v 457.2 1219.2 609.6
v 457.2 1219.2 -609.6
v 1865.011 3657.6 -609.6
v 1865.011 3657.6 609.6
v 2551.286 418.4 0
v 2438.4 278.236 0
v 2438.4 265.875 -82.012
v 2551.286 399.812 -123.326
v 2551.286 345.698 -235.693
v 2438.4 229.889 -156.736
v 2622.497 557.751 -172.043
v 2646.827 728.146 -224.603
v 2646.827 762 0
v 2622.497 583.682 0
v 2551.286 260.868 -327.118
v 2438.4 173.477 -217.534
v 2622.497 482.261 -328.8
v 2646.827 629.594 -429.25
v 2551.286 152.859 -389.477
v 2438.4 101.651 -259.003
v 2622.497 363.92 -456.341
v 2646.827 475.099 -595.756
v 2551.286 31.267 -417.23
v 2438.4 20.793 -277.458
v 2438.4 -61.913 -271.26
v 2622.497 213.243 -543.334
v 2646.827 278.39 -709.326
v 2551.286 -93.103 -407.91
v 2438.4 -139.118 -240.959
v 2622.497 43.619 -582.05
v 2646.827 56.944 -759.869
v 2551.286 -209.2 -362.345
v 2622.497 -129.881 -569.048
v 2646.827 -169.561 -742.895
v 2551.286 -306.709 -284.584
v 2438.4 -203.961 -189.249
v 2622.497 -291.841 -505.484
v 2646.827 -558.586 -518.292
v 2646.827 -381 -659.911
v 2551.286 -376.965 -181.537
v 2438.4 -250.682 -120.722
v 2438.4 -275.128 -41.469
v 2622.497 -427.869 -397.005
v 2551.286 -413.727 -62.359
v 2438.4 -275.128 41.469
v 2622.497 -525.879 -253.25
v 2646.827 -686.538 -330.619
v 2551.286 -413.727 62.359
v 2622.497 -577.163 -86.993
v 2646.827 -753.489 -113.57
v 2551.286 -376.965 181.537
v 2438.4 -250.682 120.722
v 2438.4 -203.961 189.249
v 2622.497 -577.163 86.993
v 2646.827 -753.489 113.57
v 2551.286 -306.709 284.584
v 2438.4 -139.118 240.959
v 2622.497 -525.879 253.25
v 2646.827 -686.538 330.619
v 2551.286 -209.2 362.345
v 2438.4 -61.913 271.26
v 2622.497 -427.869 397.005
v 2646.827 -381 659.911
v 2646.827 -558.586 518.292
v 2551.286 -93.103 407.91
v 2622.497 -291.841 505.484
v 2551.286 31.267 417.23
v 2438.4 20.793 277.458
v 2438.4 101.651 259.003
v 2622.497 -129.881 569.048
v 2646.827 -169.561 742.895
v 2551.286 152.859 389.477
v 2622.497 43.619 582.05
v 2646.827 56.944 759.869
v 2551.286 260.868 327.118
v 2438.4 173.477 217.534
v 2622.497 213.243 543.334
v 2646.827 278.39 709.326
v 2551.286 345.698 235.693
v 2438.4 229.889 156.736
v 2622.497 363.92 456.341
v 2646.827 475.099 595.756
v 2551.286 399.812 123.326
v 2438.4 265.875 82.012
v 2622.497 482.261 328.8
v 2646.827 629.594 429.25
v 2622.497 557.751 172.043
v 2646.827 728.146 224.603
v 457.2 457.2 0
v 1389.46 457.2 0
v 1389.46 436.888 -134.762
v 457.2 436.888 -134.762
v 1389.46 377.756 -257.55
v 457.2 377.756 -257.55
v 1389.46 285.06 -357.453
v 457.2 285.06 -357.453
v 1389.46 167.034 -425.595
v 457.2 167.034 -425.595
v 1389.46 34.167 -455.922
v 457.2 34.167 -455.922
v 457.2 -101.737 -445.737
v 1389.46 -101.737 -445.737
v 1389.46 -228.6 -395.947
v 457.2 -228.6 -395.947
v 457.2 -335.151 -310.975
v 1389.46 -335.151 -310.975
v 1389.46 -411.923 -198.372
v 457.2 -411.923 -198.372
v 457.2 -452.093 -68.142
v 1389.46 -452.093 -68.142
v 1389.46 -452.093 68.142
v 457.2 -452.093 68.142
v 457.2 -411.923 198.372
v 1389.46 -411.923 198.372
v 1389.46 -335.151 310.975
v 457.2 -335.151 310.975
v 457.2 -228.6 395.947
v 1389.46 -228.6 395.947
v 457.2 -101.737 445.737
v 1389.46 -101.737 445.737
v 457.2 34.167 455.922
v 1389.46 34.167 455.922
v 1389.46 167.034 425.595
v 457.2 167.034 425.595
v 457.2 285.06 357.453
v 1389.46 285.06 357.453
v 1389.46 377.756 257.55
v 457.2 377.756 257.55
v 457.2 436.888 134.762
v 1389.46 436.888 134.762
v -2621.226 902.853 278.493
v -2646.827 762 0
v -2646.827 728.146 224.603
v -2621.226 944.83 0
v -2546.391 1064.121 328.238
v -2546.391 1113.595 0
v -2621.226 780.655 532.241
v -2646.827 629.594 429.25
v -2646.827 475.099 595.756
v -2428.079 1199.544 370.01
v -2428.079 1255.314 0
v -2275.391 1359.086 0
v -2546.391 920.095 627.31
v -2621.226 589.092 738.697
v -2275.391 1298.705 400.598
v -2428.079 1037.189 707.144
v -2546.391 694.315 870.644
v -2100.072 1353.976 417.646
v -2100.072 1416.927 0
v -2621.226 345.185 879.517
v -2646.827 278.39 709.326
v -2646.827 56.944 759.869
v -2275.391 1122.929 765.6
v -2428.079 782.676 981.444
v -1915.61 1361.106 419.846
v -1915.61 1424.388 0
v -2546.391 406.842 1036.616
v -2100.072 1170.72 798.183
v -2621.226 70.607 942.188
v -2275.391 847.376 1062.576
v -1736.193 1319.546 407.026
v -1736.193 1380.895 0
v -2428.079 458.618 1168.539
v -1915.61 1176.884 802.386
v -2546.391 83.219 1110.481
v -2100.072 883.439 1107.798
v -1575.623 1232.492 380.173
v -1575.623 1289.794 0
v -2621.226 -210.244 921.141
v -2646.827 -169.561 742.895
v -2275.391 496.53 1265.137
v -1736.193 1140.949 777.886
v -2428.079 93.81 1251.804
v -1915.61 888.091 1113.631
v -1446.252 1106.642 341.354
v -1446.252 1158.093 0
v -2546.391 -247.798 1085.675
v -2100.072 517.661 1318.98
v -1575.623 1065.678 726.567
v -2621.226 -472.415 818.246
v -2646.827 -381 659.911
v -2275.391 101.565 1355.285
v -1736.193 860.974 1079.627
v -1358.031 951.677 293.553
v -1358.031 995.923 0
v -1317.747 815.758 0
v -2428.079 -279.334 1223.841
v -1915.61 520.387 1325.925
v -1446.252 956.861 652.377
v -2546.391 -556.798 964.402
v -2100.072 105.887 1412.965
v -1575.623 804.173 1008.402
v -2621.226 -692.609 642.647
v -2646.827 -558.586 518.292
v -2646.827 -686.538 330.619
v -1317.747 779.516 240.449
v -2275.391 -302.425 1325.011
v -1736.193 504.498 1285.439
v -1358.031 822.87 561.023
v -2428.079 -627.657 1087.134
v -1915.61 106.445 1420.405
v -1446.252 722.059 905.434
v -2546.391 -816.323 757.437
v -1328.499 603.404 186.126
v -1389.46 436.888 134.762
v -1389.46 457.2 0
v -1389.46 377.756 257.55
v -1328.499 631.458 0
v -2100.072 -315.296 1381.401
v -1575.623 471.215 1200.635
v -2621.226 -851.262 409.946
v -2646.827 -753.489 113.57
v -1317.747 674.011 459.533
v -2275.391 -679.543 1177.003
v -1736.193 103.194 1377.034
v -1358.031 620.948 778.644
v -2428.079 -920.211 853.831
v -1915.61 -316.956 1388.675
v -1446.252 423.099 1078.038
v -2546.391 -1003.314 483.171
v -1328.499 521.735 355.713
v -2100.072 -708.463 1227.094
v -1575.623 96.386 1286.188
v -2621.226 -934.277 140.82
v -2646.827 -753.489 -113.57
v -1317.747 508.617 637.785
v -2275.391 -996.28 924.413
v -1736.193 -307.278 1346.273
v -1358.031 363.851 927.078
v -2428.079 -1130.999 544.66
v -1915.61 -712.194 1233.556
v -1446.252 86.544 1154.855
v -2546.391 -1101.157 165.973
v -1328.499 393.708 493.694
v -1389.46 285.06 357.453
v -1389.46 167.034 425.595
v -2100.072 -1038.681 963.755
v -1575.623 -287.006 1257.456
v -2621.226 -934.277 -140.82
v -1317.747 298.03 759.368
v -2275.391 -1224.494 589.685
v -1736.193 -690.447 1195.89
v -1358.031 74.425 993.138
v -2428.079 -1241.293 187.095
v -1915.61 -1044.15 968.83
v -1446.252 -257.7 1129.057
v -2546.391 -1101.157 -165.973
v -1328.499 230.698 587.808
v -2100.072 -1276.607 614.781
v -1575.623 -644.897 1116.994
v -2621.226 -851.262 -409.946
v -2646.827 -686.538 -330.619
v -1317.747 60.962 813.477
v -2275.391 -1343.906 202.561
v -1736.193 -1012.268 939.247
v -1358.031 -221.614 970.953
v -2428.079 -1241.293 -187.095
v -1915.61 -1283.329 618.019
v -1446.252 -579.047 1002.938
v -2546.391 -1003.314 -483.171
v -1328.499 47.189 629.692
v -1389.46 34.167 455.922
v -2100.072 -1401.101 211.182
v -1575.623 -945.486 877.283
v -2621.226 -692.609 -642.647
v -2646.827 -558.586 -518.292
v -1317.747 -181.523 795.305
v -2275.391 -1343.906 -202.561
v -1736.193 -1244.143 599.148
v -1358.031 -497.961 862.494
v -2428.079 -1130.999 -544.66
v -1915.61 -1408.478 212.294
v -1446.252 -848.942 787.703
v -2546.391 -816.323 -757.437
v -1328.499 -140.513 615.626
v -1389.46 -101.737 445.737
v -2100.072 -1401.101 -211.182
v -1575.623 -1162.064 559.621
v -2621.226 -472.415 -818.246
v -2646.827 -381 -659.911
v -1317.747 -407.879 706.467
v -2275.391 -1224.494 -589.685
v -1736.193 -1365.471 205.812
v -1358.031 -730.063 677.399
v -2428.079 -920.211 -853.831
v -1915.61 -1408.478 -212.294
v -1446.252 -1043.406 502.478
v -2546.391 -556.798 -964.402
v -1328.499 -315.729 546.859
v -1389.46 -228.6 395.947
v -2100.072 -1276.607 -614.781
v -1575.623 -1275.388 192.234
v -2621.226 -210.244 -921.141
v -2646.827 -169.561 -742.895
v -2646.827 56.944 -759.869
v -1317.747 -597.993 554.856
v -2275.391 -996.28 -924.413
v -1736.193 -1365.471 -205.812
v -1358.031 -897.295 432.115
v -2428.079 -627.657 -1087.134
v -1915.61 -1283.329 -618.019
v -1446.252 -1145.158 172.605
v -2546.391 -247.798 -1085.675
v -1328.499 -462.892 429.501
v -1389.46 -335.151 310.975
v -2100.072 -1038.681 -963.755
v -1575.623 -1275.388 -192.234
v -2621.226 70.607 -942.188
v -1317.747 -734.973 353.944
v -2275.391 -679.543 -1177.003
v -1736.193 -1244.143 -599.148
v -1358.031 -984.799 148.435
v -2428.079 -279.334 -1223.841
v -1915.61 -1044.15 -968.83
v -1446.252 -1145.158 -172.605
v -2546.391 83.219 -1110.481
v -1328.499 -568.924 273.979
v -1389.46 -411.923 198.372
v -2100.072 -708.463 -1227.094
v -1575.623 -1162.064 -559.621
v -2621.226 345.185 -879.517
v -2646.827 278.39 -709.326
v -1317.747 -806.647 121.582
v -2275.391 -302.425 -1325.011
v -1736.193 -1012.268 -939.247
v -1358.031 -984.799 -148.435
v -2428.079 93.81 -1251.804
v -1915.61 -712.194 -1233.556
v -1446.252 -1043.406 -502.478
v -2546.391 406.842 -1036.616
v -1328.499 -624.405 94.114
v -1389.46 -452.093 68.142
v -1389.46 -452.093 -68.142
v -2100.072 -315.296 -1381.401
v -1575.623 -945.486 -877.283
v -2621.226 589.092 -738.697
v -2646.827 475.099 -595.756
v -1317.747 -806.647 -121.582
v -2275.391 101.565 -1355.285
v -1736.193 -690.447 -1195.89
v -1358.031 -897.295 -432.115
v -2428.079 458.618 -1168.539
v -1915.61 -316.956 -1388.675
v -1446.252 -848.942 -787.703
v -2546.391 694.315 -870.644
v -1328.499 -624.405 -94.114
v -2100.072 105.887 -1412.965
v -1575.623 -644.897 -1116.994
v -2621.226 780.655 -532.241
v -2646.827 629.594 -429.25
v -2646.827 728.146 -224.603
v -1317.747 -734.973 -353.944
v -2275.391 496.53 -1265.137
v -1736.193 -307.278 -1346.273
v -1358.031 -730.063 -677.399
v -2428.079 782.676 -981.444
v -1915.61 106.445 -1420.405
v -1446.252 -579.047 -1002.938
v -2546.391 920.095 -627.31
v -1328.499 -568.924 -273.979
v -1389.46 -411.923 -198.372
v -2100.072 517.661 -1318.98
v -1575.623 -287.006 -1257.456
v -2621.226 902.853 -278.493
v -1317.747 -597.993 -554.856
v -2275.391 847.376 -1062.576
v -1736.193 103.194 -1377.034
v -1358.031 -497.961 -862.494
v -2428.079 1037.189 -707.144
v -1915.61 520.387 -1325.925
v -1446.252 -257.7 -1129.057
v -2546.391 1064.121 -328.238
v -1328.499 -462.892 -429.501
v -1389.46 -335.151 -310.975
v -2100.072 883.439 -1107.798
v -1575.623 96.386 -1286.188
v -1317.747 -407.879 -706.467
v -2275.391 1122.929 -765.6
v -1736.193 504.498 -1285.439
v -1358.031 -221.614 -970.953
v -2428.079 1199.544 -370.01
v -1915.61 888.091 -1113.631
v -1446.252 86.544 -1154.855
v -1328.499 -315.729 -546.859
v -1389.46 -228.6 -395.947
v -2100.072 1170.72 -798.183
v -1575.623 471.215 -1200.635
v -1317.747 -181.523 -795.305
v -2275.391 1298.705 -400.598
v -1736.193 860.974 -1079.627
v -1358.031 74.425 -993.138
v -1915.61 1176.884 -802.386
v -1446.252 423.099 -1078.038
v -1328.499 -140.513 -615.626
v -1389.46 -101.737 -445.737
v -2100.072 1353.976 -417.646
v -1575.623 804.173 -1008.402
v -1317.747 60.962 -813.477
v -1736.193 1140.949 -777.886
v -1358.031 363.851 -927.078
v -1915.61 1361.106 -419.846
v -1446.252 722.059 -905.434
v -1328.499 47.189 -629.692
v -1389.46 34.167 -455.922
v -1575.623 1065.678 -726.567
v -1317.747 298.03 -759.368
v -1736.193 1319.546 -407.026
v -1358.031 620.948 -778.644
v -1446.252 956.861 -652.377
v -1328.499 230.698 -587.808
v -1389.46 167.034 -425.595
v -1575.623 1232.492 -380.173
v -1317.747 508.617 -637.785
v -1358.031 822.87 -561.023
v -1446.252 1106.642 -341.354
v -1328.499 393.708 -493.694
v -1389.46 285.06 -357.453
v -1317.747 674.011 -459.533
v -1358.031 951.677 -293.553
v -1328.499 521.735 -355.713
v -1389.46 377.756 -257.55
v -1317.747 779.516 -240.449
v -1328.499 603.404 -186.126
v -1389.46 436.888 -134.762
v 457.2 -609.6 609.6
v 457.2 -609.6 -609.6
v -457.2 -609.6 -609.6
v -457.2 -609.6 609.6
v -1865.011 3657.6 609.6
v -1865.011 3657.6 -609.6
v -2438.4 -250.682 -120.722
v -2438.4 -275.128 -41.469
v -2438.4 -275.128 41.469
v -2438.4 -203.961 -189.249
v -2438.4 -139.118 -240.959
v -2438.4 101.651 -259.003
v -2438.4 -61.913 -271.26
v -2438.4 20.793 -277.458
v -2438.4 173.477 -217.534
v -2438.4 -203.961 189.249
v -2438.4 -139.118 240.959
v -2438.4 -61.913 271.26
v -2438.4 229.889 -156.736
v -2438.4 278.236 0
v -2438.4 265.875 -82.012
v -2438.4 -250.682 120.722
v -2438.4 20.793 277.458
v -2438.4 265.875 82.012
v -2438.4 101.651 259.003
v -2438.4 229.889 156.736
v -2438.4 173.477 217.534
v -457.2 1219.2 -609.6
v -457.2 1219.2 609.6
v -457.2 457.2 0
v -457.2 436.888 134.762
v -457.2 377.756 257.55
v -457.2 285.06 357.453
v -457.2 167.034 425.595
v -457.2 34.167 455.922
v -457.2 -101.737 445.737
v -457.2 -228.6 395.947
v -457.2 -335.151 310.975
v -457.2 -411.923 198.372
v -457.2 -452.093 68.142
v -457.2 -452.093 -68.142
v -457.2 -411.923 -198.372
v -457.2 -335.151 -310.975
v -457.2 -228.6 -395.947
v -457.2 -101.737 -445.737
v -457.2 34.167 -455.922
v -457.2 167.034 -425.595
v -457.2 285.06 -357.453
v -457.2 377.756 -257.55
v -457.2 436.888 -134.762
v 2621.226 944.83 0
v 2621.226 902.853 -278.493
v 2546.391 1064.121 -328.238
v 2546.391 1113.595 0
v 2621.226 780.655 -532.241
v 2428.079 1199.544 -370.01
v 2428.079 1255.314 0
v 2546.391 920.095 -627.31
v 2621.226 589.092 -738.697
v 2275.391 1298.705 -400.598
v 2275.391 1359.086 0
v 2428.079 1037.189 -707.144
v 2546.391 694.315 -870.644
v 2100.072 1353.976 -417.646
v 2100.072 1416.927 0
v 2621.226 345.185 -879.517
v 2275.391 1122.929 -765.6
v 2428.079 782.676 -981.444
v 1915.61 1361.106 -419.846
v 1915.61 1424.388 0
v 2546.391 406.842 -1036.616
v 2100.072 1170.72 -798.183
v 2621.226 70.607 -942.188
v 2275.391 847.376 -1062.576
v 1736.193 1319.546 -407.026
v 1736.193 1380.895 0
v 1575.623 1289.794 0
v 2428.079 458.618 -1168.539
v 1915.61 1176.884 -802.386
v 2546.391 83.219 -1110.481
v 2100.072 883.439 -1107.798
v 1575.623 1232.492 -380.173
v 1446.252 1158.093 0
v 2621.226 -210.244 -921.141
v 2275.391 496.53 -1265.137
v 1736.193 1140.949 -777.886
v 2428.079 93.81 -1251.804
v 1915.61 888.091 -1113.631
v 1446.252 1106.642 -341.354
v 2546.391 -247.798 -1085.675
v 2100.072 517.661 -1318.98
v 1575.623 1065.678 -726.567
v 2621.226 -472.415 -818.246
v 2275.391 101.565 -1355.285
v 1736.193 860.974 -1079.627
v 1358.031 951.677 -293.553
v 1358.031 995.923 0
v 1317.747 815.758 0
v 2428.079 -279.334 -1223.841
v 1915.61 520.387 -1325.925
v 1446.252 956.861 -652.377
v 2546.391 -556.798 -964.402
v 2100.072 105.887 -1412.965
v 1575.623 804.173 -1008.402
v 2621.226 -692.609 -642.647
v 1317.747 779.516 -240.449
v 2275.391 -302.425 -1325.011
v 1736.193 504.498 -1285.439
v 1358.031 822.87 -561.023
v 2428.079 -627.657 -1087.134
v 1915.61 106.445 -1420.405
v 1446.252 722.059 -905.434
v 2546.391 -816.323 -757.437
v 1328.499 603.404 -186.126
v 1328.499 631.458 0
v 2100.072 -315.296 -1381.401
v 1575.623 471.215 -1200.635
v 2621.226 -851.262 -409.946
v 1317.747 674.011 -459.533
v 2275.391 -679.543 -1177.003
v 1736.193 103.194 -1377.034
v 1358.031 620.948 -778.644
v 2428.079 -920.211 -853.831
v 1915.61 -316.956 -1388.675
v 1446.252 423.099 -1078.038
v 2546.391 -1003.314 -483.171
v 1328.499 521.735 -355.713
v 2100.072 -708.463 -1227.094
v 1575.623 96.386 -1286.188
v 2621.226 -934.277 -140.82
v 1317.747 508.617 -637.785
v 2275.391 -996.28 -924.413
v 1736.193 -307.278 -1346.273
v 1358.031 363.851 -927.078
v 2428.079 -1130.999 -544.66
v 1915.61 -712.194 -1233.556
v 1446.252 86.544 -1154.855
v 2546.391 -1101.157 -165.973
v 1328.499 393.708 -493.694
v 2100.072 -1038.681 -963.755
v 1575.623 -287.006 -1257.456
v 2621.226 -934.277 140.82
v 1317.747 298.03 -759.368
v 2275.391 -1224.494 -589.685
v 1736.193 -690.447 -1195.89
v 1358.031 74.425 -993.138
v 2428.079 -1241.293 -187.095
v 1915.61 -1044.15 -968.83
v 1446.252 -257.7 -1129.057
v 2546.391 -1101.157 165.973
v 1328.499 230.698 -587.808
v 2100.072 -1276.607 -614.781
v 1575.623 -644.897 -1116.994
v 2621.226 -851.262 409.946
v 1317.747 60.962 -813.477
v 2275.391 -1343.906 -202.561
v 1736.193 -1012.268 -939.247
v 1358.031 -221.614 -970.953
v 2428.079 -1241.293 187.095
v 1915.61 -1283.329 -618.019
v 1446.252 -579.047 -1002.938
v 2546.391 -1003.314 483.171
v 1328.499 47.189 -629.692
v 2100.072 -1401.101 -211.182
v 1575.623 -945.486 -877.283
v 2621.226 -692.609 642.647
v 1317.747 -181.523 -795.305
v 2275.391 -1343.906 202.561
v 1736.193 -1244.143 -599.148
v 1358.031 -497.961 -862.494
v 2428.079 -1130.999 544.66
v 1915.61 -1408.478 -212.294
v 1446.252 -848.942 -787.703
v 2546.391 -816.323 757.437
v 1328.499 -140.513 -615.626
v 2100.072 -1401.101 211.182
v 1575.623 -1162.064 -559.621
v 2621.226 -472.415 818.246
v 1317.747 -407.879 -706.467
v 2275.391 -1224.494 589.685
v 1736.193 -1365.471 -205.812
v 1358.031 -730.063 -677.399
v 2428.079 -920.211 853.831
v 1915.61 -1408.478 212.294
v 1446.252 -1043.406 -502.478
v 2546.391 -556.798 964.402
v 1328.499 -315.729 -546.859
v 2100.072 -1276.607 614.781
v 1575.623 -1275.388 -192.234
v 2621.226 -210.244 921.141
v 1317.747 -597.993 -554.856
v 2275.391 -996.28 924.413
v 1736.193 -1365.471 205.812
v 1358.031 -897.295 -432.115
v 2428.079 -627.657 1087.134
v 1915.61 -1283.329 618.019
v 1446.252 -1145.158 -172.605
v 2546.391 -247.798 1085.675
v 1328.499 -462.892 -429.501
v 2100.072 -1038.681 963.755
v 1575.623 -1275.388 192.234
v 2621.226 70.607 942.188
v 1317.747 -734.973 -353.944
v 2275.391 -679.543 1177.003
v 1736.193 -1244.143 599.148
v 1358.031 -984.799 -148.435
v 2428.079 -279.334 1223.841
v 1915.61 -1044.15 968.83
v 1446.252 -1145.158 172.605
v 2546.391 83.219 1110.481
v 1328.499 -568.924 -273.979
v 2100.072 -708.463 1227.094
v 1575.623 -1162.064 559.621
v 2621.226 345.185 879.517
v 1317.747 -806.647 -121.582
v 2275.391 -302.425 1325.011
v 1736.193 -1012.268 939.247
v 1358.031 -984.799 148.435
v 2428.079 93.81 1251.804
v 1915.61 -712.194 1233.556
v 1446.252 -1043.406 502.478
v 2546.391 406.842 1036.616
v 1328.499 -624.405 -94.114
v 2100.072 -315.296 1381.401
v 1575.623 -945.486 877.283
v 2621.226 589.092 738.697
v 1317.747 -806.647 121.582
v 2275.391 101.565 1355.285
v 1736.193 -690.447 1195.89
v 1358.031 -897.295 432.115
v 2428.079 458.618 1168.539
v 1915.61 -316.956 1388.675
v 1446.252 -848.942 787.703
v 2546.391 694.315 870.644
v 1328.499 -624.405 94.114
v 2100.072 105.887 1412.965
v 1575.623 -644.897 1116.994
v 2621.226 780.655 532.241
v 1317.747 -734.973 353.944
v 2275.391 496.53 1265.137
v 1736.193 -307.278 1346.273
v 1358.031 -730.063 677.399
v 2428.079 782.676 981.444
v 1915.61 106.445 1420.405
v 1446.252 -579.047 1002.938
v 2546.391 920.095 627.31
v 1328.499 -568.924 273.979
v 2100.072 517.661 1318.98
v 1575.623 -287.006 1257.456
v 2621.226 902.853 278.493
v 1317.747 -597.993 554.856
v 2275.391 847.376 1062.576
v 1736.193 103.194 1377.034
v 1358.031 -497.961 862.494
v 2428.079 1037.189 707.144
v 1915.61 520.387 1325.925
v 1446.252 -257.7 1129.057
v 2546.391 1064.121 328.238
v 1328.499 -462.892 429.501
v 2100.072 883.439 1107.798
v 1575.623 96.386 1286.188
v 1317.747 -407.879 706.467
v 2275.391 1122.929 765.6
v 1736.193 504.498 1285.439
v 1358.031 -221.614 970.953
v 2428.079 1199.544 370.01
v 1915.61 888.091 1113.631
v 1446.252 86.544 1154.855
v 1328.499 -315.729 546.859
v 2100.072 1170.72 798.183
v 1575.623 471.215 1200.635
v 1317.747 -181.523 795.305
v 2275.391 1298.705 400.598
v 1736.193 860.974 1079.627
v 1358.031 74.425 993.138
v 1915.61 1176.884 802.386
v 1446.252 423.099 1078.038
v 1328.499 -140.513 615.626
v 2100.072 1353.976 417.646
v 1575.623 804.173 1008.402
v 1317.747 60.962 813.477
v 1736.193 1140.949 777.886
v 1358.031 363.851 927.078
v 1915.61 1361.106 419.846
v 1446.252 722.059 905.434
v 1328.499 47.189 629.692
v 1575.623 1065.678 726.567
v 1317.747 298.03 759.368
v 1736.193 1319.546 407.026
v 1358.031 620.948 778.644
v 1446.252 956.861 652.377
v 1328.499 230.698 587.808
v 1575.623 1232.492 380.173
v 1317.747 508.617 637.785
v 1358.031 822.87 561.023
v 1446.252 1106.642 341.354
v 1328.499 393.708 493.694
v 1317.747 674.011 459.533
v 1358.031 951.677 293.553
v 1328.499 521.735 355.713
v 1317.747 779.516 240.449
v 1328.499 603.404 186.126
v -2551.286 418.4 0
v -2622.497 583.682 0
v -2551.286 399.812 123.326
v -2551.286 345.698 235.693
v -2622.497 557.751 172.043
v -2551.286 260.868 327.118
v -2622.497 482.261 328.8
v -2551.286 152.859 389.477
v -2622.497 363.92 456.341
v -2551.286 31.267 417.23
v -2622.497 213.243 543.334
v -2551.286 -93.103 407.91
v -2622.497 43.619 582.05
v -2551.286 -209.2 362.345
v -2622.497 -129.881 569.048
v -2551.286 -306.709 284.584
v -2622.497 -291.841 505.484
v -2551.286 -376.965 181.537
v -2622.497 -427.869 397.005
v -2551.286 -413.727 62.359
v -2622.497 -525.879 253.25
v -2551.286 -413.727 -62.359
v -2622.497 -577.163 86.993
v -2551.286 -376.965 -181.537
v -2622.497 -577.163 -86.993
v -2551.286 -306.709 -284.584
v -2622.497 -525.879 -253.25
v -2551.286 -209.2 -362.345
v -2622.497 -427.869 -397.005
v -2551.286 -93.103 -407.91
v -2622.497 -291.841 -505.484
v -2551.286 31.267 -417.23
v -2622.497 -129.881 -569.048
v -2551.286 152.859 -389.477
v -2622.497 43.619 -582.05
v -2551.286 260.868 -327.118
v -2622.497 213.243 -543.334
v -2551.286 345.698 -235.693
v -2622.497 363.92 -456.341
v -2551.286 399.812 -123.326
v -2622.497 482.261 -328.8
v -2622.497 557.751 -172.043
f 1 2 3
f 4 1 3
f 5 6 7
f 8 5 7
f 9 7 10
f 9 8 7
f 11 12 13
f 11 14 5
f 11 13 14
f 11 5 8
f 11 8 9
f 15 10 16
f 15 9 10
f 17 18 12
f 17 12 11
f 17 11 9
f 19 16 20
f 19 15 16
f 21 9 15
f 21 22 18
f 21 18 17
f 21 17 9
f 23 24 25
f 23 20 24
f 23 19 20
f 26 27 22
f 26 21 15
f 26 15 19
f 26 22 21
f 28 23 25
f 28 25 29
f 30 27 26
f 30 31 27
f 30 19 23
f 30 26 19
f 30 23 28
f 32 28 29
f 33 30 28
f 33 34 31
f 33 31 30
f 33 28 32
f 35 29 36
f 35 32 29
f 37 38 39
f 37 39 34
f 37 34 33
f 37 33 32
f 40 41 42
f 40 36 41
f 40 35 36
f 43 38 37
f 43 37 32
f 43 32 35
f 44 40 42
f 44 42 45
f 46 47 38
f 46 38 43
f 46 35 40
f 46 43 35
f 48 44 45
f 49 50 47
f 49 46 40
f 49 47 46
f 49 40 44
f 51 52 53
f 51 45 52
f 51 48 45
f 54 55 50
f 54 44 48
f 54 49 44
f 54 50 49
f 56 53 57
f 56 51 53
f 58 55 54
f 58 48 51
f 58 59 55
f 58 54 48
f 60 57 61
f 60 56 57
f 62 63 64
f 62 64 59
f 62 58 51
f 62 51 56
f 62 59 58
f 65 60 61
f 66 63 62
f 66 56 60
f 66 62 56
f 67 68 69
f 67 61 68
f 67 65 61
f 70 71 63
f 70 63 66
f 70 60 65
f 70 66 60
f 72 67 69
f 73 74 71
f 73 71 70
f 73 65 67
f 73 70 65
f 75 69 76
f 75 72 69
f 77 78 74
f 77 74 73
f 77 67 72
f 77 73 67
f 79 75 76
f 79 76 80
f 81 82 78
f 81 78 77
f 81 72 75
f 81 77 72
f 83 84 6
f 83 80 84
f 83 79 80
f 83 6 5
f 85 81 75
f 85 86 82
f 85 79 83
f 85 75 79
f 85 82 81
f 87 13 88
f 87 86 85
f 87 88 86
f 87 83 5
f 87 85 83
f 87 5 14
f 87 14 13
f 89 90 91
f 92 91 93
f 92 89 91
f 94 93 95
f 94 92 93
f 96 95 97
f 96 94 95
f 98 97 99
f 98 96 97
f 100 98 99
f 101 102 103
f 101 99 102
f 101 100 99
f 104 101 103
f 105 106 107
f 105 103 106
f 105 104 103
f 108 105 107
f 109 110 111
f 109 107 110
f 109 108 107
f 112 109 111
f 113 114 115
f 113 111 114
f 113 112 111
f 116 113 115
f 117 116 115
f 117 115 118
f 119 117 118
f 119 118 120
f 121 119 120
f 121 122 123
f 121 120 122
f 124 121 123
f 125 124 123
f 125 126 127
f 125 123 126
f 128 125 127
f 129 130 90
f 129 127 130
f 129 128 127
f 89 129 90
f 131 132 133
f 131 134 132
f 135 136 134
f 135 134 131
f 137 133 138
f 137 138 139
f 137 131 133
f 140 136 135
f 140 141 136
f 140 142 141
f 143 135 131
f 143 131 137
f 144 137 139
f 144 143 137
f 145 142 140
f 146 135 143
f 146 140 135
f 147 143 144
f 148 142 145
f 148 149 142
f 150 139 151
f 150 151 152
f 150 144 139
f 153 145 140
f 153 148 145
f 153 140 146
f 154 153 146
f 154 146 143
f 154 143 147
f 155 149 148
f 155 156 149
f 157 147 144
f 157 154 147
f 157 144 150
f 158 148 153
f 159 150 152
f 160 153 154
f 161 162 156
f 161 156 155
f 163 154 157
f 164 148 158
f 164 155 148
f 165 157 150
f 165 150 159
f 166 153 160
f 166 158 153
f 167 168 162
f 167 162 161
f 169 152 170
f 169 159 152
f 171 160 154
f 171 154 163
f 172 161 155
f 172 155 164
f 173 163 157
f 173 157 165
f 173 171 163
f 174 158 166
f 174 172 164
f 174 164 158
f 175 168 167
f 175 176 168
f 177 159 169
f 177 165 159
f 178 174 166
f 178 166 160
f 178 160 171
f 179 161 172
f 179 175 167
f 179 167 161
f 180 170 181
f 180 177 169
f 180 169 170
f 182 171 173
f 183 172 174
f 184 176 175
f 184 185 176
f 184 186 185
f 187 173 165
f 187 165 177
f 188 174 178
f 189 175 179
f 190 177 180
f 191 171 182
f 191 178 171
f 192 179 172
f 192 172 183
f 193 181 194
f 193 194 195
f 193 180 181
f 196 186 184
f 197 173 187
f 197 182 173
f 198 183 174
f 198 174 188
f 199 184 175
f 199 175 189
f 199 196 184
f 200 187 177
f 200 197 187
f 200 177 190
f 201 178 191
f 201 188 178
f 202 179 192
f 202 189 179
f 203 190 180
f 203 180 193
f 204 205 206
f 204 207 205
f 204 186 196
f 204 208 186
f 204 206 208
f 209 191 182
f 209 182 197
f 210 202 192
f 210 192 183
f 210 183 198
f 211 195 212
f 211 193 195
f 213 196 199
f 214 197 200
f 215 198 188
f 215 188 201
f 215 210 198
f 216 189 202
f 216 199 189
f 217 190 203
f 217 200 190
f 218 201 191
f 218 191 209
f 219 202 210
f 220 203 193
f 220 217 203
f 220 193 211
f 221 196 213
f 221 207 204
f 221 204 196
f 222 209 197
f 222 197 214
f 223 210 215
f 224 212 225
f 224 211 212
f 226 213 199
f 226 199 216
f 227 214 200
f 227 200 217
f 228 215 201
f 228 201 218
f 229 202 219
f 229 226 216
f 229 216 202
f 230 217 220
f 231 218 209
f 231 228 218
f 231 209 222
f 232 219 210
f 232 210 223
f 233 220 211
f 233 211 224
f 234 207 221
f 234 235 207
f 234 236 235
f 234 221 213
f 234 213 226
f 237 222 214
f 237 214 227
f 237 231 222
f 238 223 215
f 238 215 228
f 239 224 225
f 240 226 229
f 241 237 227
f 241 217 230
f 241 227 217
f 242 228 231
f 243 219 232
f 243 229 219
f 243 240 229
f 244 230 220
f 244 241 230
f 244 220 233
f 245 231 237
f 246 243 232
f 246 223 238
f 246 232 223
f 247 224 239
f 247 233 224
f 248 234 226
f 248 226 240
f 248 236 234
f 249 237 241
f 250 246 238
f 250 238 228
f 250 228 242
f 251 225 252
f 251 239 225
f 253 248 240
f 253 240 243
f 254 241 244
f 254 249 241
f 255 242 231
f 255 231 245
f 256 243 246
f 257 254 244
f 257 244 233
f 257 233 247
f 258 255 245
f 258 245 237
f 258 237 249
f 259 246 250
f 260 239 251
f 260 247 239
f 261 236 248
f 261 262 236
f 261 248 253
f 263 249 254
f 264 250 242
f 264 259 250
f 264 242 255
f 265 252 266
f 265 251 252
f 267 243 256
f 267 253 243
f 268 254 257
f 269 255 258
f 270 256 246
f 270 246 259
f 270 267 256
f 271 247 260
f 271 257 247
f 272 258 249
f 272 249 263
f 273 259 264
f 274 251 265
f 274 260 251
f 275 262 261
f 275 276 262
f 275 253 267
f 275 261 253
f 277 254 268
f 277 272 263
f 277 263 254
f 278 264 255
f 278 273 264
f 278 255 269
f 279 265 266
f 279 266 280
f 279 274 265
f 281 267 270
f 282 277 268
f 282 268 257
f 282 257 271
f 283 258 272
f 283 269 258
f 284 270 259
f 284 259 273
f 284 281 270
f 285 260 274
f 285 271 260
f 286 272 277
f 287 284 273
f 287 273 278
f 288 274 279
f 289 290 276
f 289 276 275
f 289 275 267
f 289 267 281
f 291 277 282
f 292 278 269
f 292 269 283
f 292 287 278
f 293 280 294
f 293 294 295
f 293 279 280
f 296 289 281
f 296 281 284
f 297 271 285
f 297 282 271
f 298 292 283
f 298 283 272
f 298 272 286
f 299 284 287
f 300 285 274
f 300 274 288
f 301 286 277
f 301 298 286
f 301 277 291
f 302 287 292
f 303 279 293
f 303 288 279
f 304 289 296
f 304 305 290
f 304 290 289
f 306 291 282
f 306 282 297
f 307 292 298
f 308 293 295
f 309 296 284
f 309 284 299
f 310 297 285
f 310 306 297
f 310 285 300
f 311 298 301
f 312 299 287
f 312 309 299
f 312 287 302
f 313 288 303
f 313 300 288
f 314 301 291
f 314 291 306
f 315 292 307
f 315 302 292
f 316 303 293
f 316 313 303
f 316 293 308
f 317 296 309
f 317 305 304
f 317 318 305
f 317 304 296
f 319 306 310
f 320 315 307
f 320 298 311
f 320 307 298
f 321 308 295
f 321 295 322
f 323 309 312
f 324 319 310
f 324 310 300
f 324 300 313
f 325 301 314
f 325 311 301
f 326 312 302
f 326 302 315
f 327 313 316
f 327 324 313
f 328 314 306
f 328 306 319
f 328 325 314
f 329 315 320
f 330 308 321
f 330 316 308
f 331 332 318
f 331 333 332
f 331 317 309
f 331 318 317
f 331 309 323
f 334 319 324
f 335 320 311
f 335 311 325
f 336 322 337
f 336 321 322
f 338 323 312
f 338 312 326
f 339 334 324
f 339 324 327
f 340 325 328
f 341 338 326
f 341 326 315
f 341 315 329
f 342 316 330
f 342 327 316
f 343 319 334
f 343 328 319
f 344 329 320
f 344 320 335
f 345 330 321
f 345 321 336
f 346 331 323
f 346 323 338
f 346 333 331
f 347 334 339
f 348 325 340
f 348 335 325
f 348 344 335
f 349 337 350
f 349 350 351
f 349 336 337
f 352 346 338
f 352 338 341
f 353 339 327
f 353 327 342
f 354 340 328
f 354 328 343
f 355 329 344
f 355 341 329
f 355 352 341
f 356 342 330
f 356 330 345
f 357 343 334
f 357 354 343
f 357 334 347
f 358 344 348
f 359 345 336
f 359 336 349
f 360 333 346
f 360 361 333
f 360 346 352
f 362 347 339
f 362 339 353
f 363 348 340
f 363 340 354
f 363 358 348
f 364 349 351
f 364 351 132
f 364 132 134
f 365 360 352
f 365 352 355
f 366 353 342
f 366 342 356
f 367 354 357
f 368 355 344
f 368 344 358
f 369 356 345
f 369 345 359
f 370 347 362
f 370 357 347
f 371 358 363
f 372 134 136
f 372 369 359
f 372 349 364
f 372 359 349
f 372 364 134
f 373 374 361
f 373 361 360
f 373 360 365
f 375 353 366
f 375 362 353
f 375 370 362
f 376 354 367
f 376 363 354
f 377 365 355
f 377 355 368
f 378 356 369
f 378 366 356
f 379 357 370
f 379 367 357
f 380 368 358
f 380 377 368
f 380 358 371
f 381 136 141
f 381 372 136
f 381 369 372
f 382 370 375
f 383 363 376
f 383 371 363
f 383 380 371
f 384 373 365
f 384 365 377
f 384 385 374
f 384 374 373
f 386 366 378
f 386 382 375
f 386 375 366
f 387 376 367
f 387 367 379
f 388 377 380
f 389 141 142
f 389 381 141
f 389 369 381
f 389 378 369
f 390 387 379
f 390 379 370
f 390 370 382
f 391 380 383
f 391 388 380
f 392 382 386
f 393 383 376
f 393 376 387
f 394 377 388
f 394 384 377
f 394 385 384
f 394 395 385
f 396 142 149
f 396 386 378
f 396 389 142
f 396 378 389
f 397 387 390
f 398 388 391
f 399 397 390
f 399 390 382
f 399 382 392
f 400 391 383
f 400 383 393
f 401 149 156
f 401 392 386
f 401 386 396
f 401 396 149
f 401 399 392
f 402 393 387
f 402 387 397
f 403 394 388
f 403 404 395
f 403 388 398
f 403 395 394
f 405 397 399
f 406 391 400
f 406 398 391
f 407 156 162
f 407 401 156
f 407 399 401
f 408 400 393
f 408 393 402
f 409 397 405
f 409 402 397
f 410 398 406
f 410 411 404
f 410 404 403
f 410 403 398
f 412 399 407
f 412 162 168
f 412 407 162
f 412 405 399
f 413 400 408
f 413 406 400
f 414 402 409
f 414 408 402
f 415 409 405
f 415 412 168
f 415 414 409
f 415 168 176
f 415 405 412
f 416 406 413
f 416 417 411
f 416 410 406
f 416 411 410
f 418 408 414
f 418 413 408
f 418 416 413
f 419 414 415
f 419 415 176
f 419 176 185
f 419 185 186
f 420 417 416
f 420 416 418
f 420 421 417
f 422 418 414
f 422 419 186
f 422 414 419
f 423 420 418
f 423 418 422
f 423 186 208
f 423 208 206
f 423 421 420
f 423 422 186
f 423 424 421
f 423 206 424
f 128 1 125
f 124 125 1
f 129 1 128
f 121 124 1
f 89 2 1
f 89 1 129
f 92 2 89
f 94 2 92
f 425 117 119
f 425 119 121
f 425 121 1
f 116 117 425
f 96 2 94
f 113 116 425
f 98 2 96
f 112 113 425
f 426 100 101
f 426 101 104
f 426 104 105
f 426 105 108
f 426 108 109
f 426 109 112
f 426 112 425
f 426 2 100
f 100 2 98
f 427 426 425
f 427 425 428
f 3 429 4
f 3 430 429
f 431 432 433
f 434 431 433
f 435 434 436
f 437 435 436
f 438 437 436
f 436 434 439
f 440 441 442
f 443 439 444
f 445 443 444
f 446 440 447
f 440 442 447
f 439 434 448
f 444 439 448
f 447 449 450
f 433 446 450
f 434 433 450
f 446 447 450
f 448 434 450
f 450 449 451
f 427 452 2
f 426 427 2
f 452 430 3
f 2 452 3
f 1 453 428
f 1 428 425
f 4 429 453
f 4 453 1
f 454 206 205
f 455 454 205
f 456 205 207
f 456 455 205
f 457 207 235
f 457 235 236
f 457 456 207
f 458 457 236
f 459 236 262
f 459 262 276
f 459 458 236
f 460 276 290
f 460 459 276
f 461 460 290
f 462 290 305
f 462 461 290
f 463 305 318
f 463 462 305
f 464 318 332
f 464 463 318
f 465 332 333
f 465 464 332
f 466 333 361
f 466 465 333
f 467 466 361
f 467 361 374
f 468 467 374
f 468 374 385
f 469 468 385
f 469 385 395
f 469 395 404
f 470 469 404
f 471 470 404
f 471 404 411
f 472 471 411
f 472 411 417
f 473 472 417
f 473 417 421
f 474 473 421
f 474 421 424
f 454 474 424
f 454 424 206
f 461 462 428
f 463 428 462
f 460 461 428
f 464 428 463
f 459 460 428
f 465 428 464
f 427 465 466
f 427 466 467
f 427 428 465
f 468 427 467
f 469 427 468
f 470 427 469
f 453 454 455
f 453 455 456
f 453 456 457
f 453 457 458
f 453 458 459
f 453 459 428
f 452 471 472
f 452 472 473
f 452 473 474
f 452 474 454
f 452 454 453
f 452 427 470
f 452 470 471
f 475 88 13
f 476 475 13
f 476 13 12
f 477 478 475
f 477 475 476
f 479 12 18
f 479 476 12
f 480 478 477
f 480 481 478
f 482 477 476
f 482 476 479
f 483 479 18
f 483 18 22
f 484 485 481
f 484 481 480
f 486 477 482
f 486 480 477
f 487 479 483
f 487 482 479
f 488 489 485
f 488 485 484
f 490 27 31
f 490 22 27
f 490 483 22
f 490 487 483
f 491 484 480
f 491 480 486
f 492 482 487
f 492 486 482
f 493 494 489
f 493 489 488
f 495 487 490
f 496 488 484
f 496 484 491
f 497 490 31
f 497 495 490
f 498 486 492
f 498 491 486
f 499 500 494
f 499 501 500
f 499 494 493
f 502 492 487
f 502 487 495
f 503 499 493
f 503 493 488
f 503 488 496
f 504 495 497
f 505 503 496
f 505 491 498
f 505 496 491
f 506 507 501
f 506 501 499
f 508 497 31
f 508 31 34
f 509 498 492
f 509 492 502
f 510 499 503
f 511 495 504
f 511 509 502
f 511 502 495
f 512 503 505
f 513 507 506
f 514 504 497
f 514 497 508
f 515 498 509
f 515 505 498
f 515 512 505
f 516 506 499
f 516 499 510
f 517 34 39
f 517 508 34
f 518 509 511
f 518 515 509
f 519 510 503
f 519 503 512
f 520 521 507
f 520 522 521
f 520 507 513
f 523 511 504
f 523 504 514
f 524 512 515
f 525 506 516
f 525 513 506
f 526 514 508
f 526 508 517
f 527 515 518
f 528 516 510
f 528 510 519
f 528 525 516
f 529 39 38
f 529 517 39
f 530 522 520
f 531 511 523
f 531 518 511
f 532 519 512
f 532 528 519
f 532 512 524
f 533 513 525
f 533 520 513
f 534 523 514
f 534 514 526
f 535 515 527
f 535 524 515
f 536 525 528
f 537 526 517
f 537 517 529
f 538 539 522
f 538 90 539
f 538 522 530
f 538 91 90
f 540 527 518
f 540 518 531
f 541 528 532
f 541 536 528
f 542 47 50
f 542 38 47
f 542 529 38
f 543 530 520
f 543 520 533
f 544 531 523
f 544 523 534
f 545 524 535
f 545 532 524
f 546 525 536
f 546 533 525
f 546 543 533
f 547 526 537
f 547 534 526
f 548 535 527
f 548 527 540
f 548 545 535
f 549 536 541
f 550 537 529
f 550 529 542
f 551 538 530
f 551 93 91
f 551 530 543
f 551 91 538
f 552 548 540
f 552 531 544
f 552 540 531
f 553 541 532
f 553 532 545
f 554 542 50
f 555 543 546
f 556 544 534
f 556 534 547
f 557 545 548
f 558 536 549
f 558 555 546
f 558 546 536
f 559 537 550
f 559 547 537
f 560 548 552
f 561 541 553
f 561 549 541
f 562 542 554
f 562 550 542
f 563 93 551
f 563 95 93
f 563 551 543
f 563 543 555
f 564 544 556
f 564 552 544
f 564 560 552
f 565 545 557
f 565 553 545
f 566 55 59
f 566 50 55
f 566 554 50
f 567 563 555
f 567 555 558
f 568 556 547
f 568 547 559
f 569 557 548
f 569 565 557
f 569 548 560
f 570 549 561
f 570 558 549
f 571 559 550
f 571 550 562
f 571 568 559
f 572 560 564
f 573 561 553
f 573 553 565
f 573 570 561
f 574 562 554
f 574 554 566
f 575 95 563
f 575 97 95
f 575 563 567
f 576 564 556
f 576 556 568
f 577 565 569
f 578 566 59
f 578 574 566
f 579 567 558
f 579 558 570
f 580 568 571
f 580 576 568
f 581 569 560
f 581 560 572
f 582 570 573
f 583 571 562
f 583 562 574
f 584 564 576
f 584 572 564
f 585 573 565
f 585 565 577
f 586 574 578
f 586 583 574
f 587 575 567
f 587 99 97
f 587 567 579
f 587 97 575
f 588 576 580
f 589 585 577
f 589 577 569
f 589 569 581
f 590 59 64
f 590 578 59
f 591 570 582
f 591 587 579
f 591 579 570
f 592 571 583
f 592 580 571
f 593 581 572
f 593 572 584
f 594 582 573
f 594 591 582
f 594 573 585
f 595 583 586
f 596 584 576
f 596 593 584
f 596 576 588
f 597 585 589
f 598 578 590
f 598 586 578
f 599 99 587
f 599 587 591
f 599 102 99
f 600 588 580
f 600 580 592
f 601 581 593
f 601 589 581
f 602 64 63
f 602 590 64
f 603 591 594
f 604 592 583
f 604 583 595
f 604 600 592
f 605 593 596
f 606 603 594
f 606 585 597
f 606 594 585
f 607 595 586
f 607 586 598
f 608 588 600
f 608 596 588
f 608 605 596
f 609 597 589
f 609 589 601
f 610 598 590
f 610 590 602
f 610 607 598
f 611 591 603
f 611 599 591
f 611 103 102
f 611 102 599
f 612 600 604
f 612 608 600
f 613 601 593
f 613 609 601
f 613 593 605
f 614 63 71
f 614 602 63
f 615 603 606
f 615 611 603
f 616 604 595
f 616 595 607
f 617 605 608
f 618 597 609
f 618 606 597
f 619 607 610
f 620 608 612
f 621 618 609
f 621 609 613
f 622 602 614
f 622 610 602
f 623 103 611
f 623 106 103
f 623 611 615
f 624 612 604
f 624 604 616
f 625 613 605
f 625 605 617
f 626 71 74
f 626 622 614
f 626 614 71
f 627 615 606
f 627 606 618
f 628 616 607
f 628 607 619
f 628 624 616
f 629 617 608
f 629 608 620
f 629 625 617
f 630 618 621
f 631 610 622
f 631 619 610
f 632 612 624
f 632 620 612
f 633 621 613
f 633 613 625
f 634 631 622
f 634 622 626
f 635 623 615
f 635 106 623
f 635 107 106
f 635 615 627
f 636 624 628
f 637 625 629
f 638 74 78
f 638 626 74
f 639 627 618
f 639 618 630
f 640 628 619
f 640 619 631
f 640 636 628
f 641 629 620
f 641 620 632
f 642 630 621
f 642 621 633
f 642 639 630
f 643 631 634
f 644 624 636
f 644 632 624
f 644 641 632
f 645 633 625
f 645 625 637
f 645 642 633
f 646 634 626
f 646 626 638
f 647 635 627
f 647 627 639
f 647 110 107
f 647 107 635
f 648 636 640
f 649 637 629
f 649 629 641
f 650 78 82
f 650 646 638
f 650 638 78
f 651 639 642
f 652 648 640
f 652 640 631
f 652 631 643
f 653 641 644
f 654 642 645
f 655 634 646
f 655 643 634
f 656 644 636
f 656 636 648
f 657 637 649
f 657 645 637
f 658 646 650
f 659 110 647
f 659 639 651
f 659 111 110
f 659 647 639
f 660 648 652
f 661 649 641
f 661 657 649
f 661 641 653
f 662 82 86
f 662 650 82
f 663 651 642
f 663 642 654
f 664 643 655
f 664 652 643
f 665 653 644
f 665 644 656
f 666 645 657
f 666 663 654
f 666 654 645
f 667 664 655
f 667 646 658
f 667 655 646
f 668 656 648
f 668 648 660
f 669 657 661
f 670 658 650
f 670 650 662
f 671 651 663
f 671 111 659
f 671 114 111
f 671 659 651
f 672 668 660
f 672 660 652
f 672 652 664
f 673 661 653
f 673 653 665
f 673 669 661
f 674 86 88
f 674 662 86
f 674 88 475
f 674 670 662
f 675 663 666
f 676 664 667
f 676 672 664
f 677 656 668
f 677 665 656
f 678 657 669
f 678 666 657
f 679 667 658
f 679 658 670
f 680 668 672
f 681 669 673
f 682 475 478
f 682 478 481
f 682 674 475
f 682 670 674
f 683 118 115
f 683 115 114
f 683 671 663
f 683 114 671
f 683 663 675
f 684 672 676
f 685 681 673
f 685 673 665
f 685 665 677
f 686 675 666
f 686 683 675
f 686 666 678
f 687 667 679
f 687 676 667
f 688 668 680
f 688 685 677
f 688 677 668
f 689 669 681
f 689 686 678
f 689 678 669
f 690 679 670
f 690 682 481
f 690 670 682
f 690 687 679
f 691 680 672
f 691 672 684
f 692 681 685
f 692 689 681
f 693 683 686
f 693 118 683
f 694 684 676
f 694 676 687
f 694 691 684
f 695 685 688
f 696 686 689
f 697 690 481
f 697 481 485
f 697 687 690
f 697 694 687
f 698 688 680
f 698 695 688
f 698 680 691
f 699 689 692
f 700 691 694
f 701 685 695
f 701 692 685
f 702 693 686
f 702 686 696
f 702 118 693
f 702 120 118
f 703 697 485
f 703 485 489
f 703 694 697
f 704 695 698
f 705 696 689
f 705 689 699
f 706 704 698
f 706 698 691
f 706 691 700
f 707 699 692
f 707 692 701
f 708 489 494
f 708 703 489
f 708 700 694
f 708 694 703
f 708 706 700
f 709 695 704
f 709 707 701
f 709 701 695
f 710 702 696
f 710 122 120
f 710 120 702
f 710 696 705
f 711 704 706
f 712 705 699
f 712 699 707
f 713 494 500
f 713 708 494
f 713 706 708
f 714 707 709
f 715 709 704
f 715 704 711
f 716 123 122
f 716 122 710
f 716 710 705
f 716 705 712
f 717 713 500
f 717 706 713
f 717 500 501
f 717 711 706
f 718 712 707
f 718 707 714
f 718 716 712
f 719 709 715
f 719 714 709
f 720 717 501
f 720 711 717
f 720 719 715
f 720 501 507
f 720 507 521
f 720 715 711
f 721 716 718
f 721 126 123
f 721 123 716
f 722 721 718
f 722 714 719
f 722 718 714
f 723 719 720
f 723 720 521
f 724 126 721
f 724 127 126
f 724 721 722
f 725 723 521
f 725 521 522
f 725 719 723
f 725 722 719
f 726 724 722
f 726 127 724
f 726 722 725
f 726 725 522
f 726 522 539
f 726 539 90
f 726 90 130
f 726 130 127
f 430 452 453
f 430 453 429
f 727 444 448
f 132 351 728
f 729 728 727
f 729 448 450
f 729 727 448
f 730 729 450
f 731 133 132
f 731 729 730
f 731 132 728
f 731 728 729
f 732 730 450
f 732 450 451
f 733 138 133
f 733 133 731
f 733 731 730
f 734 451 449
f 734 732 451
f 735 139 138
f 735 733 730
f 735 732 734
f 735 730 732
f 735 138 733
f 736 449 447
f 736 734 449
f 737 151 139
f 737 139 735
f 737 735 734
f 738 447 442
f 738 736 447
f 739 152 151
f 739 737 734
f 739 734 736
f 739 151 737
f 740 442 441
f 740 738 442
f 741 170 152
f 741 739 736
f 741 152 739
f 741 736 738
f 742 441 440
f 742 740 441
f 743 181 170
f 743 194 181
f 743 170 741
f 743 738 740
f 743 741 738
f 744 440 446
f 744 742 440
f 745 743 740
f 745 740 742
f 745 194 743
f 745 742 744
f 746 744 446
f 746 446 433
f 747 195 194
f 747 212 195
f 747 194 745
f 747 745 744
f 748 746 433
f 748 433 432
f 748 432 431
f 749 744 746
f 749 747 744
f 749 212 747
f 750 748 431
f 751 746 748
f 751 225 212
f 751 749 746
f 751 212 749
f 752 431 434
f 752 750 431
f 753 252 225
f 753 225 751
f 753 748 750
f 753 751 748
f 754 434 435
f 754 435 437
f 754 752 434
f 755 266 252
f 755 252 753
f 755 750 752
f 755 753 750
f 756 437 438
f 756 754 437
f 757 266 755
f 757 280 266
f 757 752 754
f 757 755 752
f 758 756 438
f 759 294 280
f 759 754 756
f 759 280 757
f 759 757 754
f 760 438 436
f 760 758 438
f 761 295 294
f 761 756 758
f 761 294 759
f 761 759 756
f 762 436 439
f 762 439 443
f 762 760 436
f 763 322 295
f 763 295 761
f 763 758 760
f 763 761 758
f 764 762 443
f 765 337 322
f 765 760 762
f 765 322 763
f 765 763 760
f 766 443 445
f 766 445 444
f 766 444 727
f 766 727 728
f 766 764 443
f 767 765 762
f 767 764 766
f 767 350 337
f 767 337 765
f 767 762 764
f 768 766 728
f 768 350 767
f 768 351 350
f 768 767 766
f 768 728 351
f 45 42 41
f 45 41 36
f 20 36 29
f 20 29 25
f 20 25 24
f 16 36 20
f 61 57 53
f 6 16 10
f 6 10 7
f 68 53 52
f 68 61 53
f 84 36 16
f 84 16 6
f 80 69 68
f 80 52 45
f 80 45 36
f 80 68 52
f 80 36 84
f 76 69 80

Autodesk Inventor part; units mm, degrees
ref_plane "YZ Plane" through (0, 0, 0) normal (1, 0, 0) x (0, 1, 0)
ref_plane "XZ Plane" through (0, 0, 0) normal (0, 1, 0) x (-1, 0, 0)
ref_plane "XY Plane" through (0, 0, 0) normal (0, 0, 1) x (1, 0, 0)
sketch "Sketch1" plane through (0, 0, 0) normal (0, 0, 1) x (1, 0, 0)
  line L0 (457.2, 1219.2) -> (457.2, -609.6)
  line L1 (-457.2, -609.6) -> (-457.2, 1219.2)
  line L2 (-457.2, 1219.2) -> (-1865.0109, 3657.6)
  line L3 (457.2, 1219.2) -> (1865.0109, 3657.6)
  line L4 (-1865.0109, 3657.6) -> (1865.0109, 3657.6)
  line L5 (457.2, -609.6) -> (-457.2, -609.6)
extrude "Extrusion1" add sketch "Sketch1" along normal mid plane 1219.2
sketch "Sketch2" plane through (0, 0, 0) normal (1, 0, 0) x (0, 1, 0)
  circle A0 centre (0, 0) radius 457.2
extrude "Extrusion2" add sketch "Sketch2" along normal mid plane 4876.8
sketch "Sketch3" plane through (0, 0, 0) normal (0, 0, 1) x (1, 0, 0)
  line L0 (-2919.5032, 0) -> (3069.2275, 0) construction
  line L1 (2438.4, -457.2) -> (2438.4, 457.2) projected
  line L2 (457.2, 457.2) -> (2438.4, 457.2) projected
  circle A0 centre (1981.2, 762) radius 665.6271
  point P0 (2438.4, 278.236)
  point P1 (1389.4599, 457.2)
revolve "Revolution1" add sketch "Sketch3" angle 360 about axis through (-2919.5032, 0, 0) along (1, 0, 0) picked at (1765.7699, 908.3284) contours L1 L2 A0
mirror "Mirror1" about plane through (0, 0, 0) normal (1, 0, 0) of "Revolution1"
properties part number "wheels"
